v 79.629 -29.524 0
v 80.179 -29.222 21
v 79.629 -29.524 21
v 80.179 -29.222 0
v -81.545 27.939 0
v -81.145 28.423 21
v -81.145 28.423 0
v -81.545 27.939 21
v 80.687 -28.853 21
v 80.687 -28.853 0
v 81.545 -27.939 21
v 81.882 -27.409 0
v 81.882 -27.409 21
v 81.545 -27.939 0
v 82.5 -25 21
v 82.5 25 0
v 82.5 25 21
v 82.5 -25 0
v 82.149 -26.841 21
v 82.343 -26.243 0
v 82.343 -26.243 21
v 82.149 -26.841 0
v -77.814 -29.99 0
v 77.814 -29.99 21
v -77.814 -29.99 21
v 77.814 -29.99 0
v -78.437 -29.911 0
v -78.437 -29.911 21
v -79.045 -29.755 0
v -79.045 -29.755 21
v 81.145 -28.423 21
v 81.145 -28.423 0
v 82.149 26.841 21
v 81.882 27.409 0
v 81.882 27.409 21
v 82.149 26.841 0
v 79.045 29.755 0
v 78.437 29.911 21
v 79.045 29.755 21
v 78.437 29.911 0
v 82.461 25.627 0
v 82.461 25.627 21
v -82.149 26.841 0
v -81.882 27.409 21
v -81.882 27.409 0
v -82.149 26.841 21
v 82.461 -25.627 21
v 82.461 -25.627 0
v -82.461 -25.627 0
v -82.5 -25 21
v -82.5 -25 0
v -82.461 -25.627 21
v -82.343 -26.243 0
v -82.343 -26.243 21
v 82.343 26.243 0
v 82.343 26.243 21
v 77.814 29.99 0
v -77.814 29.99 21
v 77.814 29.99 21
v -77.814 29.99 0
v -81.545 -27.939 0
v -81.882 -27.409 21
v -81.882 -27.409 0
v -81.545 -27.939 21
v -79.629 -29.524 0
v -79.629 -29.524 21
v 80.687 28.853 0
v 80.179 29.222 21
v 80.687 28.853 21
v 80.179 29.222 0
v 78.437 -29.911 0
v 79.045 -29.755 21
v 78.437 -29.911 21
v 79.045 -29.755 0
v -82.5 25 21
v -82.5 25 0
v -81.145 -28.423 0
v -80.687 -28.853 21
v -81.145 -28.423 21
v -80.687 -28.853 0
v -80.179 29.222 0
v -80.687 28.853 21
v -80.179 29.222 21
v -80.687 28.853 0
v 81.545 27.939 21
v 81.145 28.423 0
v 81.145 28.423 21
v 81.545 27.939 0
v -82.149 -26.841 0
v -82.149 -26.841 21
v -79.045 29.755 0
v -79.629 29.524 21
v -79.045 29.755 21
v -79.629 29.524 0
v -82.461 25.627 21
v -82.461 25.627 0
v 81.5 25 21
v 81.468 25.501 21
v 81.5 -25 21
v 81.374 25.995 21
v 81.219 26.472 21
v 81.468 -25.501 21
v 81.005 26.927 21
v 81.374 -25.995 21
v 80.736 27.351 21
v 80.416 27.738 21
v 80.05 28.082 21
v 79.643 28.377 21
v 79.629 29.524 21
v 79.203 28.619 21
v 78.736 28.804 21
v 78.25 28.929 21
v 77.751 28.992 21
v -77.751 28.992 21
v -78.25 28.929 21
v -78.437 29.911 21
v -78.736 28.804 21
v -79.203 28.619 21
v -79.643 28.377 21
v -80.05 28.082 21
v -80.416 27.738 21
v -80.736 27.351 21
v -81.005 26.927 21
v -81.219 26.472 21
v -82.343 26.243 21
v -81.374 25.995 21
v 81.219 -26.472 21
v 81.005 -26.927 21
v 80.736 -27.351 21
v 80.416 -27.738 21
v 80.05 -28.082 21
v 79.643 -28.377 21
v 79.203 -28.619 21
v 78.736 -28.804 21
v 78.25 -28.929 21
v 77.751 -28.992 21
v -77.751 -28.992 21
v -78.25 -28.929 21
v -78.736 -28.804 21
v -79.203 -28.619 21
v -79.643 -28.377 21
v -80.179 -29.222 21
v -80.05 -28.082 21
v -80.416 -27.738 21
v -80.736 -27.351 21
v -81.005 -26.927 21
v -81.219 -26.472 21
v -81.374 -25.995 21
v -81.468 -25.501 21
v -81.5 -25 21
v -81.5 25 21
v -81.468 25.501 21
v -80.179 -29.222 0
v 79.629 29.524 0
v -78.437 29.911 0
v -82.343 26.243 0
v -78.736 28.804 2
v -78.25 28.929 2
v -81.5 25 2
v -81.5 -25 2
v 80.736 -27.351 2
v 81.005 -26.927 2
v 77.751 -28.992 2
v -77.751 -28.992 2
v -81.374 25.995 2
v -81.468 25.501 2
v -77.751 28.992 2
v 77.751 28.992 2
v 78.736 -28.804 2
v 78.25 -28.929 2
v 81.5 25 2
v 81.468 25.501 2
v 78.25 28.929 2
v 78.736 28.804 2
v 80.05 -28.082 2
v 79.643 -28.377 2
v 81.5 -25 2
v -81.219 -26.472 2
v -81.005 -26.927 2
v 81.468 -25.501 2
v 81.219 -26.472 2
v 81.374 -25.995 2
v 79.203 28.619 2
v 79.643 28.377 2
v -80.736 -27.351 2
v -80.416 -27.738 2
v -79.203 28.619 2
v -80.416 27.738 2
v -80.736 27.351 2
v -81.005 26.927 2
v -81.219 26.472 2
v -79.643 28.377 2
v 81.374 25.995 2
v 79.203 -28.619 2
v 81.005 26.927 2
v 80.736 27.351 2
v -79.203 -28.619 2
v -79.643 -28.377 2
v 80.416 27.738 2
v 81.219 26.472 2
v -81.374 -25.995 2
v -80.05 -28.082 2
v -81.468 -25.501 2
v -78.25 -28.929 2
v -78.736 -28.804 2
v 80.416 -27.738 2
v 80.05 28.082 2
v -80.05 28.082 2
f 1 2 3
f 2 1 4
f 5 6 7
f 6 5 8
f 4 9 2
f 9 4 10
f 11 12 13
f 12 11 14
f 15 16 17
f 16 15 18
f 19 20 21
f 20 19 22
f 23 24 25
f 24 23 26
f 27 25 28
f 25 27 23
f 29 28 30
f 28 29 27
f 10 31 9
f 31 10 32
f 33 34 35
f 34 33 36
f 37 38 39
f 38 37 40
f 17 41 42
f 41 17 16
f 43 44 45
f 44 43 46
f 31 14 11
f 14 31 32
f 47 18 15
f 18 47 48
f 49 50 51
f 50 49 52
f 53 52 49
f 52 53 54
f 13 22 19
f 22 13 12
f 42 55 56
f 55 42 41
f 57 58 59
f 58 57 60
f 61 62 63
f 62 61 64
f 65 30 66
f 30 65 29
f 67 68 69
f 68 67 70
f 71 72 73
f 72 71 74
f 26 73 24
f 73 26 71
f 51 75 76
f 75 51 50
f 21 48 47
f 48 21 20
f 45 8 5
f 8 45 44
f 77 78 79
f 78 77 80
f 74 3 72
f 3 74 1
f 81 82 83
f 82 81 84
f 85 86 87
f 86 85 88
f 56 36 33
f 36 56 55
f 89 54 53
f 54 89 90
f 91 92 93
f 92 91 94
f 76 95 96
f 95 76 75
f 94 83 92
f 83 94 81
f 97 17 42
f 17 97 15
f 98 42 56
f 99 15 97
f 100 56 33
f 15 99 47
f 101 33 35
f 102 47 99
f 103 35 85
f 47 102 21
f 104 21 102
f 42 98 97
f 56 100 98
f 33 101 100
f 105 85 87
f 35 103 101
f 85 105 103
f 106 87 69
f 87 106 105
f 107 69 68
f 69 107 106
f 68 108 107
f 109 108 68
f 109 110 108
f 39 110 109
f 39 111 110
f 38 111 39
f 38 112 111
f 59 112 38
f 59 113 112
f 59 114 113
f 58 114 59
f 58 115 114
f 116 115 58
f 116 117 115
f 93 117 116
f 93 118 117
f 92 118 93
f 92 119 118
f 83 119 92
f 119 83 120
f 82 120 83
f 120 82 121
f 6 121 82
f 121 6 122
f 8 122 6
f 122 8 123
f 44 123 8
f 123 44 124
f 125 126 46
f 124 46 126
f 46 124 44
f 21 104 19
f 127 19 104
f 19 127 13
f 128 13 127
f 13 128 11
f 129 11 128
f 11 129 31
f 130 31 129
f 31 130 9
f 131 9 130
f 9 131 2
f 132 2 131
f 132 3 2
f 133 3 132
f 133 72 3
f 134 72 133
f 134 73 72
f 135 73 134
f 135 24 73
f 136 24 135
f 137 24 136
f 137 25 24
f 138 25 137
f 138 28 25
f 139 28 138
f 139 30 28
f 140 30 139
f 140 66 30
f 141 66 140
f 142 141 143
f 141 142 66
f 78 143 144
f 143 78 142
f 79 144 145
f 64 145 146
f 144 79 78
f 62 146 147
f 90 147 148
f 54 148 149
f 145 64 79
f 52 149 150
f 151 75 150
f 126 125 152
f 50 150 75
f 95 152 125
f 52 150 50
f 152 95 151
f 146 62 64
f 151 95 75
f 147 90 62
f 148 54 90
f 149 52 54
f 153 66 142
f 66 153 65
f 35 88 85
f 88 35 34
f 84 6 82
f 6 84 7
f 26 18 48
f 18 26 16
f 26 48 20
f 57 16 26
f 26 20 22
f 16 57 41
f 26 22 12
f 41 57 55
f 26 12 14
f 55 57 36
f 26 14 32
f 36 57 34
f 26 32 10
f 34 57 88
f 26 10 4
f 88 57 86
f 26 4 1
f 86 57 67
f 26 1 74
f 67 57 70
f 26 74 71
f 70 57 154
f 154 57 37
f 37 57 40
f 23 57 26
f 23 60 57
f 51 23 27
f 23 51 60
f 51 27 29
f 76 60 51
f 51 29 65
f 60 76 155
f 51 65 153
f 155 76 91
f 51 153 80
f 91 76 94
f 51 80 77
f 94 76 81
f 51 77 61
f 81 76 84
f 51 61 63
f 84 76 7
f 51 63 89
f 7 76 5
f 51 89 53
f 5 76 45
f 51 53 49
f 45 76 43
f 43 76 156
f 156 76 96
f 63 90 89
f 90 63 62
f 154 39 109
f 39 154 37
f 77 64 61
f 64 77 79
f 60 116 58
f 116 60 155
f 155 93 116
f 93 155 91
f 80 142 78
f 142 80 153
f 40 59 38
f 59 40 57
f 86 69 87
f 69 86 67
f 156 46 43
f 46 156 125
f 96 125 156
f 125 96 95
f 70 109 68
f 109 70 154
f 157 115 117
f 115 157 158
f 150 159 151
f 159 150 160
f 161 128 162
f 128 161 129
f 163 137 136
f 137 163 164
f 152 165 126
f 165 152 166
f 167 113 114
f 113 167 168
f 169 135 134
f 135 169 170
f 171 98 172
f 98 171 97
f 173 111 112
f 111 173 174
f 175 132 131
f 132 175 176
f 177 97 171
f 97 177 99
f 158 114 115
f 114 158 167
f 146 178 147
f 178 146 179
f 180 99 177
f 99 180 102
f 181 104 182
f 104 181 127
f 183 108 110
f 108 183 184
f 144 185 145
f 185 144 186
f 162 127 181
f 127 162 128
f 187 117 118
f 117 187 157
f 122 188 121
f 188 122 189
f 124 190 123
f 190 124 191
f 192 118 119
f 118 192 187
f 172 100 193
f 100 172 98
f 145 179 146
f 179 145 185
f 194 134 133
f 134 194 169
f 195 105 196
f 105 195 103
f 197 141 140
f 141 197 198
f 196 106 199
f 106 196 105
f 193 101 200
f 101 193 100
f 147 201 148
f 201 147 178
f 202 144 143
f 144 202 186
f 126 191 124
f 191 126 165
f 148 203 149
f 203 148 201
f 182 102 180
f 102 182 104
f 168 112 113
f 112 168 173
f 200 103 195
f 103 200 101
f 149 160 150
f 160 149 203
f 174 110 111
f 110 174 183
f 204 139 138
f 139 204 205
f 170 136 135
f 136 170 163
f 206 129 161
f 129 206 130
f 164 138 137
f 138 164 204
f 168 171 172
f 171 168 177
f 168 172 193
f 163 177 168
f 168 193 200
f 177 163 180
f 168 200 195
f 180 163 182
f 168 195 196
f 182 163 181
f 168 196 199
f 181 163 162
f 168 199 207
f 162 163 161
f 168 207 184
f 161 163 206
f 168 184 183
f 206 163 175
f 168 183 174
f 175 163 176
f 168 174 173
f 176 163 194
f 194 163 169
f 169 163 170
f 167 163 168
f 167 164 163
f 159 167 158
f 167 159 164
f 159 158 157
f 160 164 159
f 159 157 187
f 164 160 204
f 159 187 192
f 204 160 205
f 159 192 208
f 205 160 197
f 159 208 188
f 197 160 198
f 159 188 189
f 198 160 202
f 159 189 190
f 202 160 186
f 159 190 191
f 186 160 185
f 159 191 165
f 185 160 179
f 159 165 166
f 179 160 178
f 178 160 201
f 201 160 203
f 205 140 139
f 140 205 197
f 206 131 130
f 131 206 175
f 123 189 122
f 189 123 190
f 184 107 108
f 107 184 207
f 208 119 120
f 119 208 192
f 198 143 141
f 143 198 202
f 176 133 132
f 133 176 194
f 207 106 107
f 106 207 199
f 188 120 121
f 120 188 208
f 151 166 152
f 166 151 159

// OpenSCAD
$fn = 50;


difference() {
	union() {
		hull() {
			translate(v = [-77.5000000000, 25.0000000000, 0]) {
				cylinder(h = 21, r = 5);
			}
			translate(v = [77.5000000000, 25.0000000000, 0]) {
				cylinder(h = 21, r = 5);
			}
			translate(v = [-77.5000000000, -25.0000000000, 0]) {
				cylinder(h = 21, r = 5);
			}
			translate(v = [77.5000000000, -25.0000000000, 0]) {
				cylinder(h = 21, r = 5);
			}
		}
	}
	union() {
		translate(v = [0, 0, 2]) {
			hull() {
				translate(v = [-77.5000000000, 25.0000000000, 0]) {
					cylinder(h = 19, r = 4);
				}
				translate(v = [77.5000000000, 25.0000000000, 0]) {
					cylinder(h = 19, r = 4);
				}
				translate(v = [-77.5000000000, -25.0000000000, 0]) {
					cylinder(h = 19, r = 4);
				}
				translate(v = [77.5000000000, -25.0000000000, 0]) {
					cylinder(h = 19, r = 4);
				}
			}
		}
	}
}
